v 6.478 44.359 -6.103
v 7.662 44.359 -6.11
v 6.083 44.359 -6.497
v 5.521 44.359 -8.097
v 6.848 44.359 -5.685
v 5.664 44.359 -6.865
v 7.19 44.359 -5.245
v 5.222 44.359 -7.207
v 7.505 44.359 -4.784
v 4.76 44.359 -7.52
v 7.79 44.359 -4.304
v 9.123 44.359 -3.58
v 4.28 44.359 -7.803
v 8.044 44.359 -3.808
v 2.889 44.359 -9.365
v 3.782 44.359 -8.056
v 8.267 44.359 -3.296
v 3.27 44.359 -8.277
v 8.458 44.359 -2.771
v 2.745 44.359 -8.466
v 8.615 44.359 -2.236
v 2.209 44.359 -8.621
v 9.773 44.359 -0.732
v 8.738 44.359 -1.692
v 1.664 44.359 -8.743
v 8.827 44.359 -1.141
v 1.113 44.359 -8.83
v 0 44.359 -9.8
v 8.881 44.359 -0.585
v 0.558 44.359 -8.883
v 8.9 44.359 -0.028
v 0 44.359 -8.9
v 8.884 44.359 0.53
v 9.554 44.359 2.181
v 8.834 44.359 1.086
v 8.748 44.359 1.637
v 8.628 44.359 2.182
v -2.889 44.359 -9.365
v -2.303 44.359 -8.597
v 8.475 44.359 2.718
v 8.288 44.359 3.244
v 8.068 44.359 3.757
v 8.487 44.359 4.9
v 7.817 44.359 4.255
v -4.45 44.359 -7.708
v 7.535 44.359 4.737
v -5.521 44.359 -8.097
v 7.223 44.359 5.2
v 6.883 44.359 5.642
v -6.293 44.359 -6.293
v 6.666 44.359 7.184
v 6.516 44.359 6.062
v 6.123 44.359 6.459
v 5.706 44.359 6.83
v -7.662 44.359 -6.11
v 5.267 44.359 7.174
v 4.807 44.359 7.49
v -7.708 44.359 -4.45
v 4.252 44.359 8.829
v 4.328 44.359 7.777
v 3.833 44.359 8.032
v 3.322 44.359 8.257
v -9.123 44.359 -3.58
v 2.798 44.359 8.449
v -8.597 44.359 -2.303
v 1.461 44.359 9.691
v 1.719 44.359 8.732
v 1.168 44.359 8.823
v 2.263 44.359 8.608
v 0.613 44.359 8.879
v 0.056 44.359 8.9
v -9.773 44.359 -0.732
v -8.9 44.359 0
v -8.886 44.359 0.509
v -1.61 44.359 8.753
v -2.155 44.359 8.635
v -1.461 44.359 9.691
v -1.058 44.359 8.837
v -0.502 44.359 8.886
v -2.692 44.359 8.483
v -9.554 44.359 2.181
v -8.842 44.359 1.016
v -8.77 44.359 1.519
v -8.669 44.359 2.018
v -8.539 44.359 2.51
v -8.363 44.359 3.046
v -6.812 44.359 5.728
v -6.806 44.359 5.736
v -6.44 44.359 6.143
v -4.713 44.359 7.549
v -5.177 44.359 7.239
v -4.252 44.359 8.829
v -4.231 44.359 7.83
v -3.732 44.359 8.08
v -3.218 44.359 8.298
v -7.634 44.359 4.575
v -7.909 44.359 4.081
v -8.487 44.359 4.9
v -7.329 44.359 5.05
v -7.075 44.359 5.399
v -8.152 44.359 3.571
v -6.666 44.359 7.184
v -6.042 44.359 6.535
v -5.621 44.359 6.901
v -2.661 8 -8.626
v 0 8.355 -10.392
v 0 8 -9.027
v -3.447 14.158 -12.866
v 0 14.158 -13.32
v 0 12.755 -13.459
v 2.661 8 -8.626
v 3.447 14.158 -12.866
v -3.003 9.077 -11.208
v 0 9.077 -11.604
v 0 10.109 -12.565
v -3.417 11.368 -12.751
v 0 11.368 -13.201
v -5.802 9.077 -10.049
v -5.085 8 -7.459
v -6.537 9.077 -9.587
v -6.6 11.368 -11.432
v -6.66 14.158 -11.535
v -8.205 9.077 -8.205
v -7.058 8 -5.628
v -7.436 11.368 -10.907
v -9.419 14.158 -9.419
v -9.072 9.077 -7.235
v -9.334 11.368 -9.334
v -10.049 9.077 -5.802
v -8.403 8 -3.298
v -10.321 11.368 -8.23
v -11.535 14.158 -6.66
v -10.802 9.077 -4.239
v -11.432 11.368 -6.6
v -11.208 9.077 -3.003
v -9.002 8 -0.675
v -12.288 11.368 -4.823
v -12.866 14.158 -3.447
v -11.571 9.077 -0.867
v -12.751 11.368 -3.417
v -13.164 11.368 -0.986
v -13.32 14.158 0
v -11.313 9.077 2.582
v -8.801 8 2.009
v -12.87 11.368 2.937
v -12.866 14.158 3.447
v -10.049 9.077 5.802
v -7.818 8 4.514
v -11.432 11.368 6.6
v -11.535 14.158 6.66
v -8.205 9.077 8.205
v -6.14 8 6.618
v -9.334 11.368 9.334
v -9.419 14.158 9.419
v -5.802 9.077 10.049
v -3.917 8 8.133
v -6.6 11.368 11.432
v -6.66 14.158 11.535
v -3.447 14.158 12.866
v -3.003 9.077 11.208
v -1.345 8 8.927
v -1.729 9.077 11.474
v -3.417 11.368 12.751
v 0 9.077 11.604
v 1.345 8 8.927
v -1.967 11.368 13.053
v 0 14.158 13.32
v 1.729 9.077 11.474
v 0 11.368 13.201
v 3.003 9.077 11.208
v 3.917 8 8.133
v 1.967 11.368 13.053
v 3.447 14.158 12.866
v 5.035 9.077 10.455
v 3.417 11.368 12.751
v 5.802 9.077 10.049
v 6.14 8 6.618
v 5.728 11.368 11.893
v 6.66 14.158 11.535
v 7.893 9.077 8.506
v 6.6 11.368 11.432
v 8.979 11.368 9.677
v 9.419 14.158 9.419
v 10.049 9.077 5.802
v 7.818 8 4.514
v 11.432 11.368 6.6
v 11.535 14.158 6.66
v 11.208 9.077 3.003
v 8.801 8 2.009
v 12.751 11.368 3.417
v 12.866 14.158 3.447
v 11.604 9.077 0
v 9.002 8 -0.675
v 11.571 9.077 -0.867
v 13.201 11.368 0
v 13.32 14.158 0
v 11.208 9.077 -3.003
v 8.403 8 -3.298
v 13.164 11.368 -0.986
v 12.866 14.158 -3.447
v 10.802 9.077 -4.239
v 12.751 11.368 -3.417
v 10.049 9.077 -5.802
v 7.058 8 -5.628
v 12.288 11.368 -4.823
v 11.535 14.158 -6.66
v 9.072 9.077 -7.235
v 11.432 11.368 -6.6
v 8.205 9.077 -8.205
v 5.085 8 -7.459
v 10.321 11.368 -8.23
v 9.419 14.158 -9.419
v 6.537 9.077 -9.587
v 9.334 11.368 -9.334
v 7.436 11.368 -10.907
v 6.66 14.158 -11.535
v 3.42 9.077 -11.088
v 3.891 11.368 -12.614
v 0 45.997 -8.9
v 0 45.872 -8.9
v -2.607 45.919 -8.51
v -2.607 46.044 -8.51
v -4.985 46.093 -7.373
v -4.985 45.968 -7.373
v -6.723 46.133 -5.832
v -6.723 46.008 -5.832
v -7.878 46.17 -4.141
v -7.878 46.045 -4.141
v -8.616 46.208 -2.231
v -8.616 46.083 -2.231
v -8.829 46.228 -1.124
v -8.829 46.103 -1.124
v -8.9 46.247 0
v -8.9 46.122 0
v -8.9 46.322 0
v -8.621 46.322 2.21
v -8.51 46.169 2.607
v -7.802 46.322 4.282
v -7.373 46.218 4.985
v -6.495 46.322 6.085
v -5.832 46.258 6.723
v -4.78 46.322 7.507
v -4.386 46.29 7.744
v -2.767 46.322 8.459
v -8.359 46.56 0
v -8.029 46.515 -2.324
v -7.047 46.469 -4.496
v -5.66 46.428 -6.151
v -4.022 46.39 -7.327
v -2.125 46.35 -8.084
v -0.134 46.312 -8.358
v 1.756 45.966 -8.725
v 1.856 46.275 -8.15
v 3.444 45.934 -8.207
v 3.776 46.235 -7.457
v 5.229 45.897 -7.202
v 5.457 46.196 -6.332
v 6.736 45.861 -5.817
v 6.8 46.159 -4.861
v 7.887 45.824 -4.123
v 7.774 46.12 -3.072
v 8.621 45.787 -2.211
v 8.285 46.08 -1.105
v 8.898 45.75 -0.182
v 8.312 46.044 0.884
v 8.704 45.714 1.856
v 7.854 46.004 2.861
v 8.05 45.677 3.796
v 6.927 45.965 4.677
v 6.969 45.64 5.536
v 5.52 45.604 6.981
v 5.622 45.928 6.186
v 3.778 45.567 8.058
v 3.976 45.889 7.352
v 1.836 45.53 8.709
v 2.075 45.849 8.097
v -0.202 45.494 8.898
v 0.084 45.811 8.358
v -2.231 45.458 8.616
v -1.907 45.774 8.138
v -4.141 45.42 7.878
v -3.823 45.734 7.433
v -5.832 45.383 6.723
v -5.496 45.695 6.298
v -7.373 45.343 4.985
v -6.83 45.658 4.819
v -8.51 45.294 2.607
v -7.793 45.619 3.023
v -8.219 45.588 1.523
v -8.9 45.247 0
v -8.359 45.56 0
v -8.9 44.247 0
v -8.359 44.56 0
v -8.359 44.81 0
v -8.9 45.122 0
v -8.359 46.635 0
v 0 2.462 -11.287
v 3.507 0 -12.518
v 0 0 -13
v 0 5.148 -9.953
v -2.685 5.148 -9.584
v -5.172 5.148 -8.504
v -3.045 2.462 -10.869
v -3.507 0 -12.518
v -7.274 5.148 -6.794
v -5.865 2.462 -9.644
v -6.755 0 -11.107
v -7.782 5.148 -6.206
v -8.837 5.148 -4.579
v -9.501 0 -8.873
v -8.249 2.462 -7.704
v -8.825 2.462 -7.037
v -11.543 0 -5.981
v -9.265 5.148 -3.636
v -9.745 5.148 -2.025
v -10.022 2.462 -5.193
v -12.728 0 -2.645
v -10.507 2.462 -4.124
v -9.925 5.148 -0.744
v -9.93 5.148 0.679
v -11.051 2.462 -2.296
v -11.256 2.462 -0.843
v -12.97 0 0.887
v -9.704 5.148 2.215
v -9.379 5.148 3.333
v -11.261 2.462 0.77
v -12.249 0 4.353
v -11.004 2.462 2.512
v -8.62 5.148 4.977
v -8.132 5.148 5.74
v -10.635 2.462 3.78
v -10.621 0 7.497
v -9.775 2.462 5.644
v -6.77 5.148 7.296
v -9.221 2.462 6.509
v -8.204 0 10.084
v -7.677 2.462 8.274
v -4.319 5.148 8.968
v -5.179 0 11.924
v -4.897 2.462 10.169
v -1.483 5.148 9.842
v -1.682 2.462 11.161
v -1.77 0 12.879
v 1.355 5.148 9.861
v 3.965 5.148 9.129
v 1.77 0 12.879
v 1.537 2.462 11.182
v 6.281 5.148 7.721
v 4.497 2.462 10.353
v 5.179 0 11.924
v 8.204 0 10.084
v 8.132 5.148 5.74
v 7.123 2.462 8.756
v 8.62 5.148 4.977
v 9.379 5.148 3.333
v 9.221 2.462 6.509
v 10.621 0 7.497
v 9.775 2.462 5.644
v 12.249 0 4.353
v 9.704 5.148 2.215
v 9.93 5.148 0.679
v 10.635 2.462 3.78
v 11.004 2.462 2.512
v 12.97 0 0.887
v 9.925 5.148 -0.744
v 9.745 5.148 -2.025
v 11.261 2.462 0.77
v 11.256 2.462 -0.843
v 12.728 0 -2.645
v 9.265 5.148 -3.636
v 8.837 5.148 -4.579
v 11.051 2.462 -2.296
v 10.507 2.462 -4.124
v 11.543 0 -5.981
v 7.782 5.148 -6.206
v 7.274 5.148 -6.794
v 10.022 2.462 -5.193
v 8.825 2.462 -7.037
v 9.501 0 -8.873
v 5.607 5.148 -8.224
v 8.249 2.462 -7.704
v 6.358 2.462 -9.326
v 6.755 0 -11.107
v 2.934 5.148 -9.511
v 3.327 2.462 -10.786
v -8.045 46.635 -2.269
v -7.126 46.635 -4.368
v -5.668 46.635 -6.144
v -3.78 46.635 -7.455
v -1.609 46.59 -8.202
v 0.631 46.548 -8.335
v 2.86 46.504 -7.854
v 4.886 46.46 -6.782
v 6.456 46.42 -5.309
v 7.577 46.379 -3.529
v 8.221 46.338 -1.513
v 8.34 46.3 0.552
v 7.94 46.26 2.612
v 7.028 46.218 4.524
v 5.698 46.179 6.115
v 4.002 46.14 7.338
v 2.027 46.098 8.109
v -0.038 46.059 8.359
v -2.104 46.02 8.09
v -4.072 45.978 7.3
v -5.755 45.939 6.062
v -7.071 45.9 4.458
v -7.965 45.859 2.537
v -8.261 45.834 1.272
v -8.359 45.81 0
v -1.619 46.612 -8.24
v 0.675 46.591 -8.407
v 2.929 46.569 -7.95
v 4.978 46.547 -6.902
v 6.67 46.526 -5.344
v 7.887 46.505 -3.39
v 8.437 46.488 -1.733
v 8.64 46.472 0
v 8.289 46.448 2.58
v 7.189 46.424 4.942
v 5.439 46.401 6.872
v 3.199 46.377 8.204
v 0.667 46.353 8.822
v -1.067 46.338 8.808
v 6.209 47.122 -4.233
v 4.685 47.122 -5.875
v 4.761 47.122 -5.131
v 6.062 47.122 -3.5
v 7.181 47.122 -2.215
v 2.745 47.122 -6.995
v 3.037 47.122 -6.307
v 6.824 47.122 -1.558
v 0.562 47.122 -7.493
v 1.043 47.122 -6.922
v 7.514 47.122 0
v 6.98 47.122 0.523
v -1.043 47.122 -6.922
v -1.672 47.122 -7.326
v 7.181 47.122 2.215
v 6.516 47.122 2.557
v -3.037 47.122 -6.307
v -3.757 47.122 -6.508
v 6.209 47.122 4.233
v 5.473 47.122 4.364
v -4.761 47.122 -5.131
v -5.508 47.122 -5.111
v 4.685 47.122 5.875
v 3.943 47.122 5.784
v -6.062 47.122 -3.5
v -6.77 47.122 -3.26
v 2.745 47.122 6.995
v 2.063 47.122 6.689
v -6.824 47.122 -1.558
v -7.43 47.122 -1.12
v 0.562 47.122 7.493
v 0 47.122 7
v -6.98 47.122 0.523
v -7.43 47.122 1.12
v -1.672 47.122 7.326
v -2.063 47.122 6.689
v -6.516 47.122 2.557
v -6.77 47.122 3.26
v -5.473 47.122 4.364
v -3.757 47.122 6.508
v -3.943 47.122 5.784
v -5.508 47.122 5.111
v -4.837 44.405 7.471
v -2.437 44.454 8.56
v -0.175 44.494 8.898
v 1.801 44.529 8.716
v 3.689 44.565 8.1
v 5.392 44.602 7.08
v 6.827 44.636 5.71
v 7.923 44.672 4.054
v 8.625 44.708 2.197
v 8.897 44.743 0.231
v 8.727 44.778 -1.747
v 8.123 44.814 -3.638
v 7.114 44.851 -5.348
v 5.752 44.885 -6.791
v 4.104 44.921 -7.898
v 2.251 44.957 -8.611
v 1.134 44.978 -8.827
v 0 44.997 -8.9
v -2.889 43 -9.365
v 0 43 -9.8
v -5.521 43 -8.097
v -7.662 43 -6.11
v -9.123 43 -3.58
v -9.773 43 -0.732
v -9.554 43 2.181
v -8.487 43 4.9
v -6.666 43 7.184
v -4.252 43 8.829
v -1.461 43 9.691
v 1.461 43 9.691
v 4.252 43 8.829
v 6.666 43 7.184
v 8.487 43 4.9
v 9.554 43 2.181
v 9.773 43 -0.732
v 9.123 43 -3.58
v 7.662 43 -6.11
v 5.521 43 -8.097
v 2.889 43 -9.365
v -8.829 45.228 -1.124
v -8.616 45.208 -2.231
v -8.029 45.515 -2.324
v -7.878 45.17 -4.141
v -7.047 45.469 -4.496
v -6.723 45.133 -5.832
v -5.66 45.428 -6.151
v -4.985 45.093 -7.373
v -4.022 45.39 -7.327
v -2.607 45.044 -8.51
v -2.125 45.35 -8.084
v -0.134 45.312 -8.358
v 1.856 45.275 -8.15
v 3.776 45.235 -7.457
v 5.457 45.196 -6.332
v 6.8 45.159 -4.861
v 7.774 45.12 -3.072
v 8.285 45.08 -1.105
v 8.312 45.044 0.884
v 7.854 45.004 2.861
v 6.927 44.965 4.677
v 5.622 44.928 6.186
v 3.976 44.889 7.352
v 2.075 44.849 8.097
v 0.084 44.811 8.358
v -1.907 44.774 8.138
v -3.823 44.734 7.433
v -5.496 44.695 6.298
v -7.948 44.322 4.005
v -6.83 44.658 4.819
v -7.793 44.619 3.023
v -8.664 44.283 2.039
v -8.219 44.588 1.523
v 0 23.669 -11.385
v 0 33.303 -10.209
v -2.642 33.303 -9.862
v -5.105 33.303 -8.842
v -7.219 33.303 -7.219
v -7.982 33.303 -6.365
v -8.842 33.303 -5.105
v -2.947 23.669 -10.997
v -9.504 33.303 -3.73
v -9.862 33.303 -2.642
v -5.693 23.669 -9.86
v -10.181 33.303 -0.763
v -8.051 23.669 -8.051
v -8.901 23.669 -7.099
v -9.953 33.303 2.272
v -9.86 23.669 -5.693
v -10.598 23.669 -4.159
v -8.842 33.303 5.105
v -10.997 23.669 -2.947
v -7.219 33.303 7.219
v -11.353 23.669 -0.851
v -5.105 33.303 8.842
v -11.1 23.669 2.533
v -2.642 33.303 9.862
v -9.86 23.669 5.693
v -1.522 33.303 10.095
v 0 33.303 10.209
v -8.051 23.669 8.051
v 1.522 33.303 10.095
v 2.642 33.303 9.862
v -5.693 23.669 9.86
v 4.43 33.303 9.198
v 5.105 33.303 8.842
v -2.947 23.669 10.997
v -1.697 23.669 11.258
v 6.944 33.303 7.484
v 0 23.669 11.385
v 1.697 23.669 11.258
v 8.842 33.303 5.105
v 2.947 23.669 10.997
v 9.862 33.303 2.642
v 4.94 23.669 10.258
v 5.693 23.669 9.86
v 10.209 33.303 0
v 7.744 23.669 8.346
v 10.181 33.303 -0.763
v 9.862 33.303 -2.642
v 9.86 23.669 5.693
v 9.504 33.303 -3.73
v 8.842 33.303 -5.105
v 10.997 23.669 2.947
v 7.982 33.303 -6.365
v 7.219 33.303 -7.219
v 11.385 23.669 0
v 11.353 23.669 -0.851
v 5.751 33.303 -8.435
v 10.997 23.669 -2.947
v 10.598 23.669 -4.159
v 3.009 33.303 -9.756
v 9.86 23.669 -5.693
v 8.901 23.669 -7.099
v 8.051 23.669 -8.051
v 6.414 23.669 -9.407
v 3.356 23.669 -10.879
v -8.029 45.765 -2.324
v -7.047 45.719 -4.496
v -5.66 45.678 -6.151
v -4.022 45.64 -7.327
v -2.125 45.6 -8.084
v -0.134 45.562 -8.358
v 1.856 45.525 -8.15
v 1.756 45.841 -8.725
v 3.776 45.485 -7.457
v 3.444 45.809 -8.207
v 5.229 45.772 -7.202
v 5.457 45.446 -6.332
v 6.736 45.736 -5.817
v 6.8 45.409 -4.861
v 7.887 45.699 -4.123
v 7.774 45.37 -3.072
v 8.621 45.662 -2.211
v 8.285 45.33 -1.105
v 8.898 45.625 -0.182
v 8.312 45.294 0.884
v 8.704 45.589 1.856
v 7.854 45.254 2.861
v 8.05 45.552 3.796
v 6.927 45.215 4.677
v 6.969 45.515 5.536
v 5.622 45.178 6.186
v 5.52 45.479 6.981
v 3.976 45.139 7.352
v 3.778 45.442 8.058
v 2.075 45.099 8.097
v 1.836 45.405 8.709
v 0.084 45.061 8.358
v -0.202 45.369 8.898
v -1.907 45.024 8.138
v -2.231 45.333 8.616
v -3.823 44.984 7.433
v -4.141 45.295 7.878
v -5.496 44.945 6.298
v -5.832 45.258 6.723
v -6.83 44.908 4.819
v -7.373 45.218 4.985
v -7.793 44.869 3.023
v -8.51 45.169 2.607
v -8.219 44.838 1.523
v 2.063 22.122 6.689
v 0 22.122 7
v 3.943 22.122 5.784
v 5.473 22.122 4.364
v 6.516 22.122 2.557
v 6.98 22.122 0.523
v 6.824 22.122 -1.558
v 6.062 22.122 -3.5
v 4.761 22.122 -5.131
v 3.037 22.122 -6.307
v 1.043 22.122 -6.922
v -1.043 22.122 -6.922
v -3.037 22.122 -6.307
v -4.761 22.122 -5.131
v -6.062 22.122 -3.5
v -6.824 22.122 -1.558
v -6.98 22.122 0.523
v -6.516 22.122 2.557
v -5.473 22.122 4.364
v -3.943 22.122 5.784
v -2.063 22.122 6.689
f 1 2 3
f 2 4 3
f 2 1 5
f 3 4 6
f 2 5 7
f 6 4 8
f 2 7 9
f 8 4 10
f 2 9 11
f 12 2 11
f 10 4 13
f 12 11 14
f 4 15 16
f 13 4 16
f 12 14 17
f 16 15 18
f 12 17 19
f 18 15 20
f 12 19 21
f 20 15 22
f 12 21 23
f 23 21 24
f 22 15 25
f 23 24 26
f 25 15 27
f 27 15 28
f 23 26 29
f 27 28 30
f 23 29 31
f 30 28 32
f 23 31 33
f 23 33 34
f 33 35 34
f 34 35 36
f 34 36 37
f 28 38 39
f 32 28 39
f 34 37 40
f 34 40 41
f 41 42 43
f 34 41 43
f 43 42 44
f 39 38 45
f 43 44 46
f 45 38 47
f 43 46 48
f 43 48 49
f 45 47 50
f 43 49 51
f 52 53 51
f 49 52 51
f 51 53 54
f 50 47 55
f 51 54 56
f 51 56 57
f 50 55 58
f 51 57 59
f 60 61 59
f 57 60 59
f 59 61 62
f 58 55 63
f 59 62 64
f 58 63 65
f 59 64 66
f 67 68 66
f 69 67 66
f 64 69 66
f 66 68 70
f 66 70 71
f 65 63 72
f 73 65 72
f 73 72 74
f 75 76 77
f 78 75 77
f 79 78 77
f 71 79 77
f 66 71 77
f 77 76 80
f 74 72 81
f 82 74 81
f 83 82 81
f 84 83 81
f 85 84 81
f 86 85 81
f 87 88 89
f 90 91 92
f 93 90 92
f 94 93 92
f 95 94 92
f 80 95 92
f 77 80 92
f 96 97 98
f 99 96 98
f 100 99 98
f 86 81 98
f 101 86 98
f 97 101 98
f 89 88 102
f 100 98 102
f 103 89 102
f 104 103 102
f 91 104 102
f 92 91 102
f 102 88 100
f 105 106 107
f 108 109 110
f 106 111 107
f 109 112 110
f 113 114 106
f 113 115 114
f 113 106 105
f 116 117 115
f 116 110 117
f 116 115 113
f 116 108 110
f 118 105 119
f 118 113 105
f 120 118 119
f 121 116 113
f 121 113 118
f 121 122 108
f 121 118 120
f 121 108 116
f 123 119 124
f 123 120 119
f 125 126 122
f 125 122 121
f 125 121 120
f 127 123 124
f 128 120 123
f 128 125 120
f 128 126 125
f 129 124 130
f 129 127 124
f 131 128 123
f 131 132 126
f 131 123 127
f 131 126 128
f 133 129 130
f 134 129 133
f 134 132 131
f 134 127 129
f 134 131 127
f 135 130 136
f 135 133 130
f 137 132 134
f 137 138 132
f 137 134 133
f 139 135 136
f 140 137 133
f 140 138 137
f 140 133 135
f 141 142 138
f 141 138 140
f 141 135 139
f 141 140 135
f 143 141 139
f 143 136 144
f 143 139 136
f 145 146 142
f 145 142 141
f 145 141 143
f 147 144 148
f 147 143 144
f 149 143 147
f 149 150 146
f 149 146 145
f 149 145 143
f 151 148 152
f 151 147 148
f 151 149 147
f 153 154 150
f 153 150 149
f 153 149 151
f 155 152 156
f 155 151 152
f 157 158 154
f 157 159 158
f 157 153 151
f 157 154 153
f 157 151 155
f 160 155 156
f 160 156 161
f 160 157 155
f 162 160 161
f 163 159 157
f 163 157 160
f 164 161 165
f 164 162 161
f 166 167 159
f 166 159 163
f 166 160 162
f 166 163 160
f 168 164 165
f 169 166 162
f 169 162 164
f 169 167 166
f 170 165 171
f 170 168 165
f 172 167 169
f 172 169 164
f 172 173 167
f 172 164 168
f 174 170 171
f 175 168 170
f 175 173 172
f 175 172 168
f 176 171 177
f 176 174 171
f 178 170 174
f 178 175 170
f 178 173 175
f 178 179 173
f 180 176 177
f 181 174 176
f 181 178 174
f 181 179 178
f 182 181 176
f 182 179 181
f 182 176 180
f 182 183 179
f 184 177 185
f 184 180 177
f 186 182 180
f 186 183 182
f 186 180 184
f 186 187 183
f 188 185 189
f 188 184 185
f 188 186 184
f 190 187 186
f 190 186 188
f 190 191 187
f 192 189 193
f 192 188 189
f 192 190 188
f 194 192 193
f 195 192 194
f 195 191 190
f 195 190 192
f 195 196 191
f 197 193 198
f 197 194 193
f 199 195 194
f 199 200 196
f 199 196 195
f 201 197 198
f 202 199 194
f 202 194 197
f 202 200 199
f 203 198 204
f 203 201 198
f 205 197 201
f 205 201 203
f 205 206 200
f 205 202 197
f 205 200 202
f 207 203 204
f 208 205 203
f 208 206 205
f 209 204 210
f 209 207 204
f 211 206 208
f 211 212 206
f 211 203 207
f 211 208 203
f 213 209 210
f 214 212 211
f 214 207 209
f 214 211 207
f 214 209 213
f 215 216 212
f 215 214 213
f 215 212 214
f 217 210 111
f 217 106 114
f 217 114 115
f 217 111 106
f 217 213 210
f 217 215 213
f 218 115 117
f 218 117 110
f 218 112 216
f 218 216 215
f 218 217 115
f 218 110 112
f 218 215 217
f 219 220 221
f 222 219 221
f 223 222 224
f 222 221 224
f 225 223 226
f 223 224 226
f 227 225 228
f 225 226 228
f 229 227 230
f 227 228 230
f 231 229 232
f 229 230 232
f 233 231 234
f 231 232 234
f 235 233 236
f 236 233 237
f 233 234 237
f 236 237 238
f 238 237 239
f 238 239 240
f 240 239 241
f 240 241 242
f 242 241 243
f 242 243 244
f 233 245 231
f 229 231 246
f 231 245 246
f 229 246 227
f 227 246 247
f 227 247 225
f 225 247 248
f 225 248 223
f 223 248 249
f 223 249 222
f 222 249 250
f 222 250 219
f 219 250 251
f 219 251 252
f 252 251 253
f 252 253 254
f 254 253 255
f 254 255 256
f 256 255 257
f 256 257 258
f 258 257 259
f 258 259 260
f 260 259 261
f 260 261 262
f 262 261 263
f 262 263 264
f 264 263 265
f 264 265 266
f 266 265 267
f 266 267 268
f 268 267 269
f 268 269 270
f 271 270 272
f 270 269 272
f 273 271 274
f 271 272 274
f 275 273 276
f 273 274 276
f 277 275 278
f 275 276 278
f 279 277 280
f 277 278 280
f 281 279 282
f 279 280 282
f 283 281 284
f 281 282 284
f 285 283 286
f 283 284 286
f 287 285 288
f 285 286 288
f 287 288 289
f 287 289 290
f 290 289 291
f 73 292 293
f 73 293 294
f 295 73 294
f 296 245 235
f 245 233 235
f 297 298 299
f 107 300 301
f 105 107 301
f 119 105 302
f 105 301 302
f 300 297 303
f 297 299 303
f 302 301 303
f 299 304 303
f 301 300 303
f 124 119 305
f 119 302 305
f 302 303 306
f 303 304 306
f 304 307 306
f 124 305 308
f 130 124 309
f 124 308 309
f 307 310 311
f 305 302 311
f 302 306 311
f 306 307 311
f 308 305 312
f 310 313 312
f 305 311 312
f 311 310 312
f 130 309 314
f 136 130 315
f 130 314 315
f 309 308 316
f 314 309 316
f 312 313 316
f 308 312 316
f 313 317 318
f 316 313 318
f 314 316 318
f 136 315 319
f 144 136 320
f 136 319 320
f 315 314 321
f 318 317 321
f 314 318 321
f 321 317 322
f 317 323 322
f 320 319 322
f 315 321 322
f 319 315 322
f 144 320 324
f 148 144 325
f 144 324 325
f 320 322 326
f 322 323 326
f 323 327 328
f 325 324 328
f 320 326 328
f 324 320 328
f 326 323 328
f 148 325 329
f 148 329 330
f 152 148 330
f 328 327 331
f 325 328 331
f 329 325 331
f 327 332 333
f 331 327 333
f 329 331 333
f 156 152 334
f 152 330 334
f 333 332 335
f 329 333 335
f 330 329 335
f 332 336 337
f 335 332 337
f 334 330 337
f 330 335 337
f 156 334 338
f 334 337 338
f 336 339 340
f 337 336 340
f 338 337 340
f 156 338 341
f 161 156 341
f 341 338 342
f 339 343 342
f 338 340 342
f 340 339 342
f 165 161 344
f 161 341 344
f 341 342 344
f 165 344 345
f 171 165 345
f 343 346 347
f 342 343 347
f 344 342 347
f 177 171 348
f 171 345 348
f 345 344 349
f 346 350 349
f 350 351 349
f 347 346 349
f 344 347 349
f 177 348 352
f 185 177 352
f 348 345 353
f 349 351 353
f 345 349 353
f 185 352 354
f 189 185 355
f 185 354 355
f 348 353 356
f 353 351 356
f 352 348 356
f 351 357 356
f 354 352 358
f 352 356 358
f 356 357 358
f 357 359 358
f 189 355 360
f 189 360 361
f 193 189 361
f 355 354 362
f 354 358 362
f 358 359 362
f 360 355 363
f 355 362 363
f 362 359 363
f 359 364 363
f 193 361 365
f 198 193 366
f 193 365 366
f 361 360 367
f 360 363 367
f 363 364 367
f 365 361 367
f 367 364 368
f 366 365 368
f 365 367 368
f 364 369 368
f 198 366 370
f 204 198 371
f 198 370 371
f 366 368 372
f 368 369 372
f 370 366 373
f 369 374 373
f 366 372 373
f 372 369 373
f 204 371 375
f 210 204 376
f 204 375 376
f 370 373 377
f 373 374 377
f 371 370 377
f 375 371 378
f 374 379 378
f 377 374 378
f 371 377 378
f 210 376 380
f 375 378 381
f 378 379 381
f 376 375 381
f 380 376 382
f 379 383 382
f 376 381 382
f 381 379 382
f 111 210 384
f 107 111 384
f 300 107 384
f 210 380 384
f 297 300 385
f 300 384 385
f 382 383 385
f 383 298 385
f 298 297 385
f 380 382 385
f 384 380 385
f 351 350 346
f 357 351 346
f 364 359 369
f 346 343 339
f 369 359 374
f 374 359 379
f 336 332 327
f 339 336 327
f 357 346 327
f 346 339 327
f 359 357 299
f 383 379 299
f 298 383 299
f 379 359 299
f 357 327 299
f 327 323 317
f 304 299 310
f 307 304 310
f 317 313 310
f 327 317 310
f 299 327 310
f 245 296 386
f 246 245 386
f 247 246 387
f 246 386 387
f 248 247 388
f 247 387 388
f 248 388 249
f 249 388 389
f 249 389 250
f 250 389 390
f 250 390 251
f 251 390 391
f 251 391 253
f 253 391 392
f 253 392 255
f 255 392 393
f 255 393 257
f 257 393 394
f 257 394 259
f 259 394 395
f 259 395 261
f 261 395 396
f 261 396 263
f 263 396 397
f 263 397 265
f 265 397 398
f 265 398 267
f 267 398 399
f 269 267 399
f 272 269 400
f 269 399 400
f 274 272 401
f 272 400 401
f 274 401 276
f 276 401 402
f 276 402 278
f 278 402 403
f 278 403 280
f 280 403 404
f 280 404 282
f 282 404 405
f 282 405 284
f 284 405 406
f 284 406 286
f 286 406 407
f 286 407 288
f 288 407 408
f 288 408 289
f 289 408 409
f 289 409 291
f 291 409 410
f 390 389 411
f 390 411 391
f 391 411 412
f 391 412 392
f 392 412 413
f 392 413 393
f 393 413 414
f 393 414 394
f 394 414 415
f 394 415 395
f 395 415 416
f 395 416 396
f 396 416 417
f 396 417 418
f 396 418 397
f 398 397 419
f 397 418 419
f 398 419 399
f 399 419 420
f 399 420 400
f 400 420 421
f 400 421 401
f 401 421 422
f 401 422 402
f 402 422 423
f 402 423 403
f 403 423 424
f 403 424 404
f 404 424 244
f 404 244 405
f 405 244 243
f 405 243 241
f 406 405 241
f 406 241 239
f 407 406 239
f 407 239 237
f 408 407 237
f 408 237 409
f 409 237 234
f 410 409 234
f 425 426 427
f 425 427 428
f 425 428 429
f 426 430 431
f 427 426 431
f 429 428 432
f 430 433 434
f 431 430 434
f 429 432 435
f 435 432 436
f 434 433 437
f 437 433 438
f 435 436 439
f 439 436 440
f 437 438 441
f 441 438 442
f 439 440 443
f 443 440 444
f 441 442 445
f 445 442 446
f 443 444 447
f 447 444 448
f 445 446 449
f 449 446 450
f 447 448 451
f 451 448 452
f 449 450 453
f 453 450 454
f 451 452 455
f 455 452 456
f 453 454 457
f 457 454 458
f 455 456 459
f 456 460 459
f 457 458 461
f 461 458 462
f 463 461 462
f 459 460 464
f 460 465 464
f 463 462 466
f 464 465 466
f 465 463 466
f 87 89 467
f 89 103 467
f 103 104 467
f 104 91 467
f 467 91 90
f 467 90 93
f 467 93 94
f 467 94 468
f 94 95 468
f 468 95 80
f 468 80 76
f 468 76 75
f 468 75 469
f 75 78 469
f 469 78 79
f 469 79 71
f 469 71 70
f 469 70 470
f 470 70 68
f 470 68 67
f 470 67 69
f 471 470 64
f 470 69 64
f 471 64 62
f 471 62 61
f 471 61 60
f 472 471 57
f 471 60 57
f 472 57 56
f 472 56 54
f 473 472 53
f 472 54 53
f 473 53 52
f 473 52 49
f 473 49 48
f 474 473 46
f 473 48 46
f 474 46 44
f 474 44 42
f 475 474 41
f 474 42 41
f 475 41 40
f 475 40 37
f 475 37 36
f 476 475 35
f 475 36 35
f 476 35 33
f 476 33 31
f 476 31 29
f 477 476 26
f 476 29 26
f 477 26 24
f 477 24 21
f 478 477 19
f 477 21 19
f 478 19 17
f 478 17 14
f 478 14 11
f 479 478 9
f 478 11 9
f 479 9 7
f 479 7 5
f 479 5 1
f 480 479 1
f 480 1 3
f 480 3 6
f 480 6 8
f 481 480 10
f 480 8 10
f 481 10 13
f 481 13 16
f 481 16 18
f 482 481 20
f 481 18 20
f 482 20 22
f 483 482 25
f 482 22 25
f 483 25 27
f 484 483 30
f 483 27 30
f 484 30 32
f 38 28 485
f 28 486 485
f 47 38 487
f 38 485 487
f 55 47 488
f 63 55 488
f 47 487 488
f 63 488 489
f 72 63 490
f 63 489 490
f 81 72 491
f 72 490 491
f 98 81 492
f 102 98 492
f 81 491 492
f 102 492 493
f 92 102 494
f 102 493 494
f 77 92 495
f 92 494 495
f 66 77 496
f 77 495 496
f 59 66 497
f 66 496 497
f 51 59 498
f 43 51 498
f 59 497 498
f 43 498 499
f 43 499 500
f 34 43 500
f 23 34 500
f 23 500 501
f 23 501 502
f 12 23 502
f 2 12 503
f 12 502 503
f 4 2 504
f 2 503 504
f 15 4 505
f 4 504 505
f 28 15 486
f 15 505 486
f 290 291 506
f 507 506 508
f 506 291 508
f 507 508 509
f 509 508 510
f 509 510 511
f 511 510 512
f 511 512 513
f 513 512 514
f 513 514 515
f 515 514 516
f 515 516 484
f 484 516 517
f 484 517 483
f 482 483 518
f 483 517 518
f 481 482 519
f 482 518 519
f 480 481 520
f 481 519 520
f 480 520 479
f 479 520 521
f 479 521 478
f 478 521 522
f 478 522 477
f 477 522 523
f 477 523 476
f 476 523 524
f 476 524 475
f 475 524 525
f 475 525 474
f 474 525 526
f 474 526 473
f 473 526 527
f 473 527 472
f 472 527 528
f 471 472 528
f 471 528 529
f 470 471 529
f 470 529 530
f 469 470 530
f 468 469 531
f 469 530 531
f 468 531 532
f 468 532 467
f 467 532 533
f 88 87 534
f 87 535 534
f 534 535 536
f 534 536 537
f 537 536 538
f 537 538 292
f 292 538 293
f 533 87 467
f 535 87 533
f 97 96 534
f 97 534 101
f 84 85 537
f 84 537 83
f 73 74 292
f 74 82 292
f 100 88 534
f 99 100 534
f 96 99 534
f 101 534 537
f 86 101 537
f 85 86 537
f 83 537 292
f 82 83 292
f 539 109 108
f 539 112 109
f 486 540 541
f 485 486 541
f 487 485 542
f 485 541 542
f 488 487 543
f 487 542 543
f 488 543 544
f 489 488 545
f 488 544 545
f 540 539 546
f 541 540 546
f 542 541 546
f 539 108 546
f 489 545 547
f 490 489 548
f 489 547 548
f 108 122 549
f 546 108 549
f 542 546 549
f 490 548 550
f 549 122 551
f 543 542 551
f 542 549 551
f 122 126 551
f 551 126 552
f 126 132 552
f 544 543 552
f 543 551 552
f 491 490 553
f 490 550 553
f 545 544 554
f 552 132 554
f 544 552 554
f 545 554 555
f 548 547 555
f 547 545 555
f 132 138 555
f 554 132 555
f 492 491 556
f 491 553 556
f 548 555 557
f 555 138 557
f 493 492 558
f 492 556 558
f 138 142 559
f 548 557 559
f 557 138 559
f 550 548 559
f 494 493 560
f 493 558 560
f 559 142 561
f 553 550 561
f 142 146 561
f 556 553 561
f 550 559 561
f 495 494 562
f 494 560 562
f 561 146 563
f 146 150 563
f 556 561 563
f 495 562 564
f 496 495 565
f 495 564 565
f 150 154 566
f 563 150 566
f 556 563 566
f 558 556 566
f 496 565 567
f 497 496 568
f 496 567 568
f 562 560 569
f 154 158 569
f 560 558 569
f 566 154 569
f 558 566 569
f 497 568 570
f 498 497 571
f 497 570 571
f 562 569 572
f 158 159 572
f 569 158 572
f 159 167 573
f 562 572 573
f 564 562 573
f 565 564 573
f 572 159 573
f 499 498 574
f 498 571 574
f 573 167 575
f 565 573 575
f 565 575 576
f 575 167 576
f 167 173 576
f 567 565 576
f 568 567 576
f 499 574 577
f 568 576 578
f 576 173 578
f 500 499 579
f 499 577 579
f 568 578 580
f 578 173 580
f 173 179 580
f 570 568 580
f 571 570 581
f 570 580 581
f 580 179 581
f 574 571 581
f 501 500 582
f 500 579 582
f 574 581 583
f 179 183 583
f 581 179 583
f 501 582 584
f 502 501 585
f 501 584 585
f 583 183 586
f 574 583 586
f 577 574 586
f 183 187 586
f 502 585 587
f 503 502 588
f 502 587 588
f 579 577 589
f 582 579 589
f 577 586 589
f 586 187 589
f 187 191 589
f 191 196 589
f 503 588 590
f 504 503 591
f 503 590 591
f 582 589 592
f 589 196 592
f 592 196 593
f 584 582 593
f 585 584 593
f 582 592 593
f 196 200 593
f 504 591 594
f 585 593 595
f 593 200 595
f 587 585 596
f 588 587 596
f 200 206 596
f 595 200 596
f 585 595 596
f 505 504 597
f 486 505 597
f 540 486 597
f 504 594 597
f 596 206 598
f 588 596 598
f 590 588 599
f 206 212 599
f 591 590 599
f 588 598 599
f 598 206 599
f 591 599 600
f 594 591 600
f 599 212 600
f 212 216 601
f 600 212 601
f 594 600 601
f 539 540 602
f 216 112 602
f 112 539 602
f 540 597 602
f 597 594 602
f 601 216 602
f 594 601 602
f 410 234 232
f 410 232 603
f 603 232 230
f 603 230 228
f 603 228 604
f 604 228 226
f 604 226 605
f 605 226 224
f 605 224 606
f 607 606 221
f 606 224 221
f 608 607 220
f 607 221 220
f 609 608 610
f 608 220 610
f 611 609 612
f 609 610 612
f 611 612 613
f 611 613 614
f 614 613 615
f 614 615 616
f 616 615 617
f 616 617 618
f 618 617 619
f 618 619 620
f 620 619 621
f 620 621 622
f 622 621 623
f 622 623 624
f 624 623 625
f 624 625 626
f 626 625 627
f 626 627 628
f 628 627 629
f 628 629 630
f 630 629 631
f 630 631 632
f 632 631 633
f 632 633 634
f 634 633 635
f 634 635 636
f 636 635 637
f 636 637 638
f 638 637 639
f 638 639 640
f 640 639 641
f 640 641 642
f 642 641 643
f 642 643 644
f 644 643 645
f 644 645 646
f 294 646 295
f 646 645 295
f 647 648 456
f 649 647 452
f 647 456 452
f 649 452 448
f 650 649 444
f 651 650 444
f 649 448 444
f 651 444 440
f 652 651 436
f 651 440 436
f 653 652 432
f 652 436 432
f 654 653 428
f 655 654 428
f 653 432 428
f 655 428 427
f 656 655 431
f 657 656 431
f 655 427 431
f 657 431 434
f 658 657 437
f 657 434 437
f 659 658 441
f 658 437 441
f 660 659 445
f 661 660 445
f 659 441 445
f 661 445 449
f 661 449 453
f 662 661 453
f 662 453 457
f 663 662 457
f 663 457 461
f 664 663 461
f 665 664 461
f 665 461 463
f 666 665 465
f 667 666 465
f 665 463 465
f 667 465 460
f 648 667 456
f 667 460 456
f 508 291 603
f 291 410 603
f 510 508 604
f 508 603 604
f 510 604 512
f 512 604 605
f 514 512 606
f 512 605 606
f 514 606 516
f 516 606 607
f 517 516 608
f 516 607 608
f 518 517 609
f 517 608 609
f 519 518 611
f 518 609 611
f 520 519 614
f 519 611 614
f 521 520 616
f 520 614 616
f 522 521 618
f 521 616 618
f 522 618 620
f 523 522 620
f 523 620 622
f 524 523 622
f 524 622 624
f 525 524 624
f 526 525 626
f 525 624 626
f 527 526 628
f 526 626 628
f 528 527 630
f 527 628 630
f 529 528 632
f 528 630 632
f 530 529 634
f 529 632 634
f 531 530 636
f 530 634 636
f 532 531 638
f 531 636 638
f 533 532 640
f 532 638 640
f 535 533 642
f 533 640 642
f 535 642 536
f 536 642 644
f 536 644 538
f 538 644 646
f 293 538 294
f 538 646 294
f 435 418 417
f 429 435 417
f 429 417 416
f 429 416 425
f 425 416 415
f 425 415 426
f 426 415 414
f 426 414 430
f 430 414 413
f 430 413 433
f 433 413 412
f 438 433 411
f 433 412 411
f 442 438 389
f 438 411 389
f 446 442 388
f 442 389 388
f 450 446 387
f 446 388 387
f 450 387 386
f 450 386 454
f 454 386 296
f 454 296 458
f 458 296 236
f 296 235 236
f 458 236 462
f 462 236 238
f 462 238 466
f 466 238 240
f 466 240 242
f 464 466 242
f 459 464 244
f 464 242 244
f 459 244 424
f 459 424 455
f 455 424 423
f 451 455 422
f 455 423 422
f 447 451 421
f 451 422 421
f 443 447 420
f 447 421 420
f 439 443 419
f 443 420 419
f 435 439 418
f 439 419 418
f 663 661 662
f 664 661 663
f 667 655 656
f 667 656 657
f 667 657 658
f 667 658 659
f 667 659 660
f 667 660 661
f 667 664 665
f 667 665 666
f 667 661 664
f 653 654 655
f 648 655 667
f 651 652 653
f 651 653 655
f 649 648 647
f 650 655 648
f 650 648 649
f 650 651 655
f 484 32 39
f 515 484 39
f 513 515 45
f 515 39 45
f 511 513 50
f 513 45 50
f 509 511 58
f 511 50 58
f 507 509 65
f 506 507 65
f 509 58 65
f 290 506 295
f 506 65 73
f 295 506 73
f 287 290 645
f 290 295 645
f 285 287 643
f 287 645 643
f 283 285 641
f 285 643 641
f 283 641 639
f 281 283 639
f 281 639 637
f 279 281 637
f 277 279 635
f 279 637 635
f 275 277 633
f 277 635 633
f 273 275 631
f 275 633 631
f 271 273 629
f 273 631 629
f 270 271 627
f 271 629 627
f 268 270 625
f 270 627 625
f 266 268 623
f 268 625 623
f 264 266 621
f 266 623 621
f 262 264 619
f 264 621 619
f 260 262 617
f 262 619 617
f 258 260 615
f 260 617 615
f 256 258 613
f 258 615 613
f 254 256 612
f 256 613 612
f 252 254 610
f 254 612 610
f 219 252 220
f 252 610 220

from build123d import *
from build123d.topology import SkipClean

# Parameters (mm, degrees)
GWINT1_PITCH               = 1
SZKIC10_R                  = 7
WYTNIJ_WYCI_GNI_CIE2_DEPTH = 25
ZAOKR_GLENIE1_R            = 5


with BuildPart() as part:
    # Szkic2 → Obrót1 (revolve)
    with BuildSketch(Plane.XY, mode=Mode.PRIVATE) as obr_t1_sk:
        with BuildLine():
            Line((0, 0), (0, 8))
            Line((0, 8), (9.027373354, 8))
            ThreePointArc((9.027373354, 8), (10.570833484, 3.780088701), (13, 0))
            Line((13, 0), (0, 0))
        make_face()
    revolve(obr_t1_sk.sketch.rotate(Axis((0, 0, 0), (0, 1, 0)), 90), axis=Axis((0, 0, 0), (0, 1, 0)))

    # Szkic4 → Obrót2 (revolve)
    with BuildSketch(Plane.XY, mode=Mode.PRIVATE) as obr_t2_sk:
        with BuildLine():
            Line((0, 8), (0, 43))
            Line((0, 43), (0, 47.12232406))
            Line((0, 47.12232406), (8.9, 47.12232406))
            Line((8.9, 47.12232406), (8.9, 45.06116203))
            Line((8.9, 45.06116203), (8.9, 44.597825987))
            Line((8.9, 44.597825987), (8.9, 44.463010207))
            Line((8.9, 44.463010207), (8.9, 44.359094252))
            Line((8.9, 44.359094252), (9.8, 44.359094252))
            Line((9.8, 44.359094252), (9.8, 43))
            ThreePointArc((9.8, 43), (11.129787622, 25.311282732), (15, 8))
            Line((15, 8), (0, 8))
        make_face()
    revolve(obr_t2_sk.sketch.rotate(Axis((0, 8, 0), (0, 1, 0)), 90), axis=Axis((0, 8, 0), (0, 1, 0)))

    # Gwint1: the profile of Profil gwintu1 profile screwed along a right-hand helix of 2 turns, 8 arcs to a turn; built about Z, then put on its axis
    with SkipClean():  # the faces are left unmerged after this step: merging them gives an invalid solid
        gwint1_z = Axis((0, 0, 0), (0, 0, 1))
        gwint1_corners = [(8.9003, 0, -0.000173205), (8.9003, 0, 0.875173202), (8.358734125, 0, 0.562499998), (8.358734125, 0, 0.312499998)]
        with BuildLine(mode=Mode.PRIVATE) as gwint1_profile:
            Line(gwint1_corners[0], gwint1_corners[1])
            Line(gwint1_corners[1], gwint1_corners[2])
            Line(gwint1_corners[2], gwint1_corners[3])
            Line(gwint1_corners[3], gwint1_corners[0])
        gwint1_cap = Face(gwint1_profile.wire())
        gwint1_turn_angles = [0, 22.5, 45, 67.5, 90, 112.5, 135, 157.5, 180, 202.5, 225, 247.5, 270, 292.5, 315, 337.5, 360]
        gwint1_turn_weights = [1, 0.9238795325112867, 1, 0.9238795325112867, 1, 0.9238795325112867, 1, 0.9238795325112867, 1, 0.9238795325112867, 1, 0.9238795325112867, 1, 0.9238795325112867, 1, 0.9238795325112867, 1]
        gwint1_turn_rails = [Edge.make_bspline([Vector(p[0], p[1], 0).rotate(gwint1_z, gwint1_turn_angles[k]) / gwint1_turn_weights[k] + Vector(0, 0, p[2] + GWINT1_PITCH * gwint1_turn_angles[k] / 360) for k in range(17)], [0, 0, 0, 1, 1, 2, 2, 3, 3, 4, 4, 5, 5, 6, 6, 7, 7, 8, 8, 8], 2, gwint1_turn_weights) for p in gwint1_corners]
        gwint1_turn_sides = [Face.make_surface_from_curves(gwint1_turn_rails[p[0]], gwint1_turn_rails[p[1]]) for p in [(0, 1), (1, 2), (2, 3), (3, 0)]]
        gwint1 = Plane(origin=(0, 47.12232406, 0), x_dir=(-1, 0, 0), z_dir=(0, -1, 0)) * Solid(Shell([*[p.moved(Location((0, 0, GWINT1_PITCH * i))) for i in range(2) for p in gwint1_turn_sides], gwint1_cap, gwint1_cap.rotate(gwint1_z, 720).moved(Location((0, 0, GWINT1_PITCH * 720 / 360)))]))
        add(gwint1, mode=Mode.SUBTRACT)

    # Wycięcie-wyciągnięcie po ścieżce1: sweep along a path in Szkic8
    with BuildLine(Plane(origin=(0, 47.12232406, 0), x_dir=(1, 0, 0), z_dir=(0, 1, 0))) as wyci_cie_wyci_gni_cie_po_cie_ce1_path:
        CenterArc((0, 0), 13, 0, 360)
    # Szkic9 → Wycięcie-wyciągnięcie po ścieżce1 (sweep, cut)
    with BuildSketch(Plane.XY):
        Polygon((8.9, 47.12232406), (8.9, 46.32232406), (7.514359354, 47.12232406), align=None)
    sweep(path=wyci_cie_wyci_gni_cie_po_cie_ce1_path.line, mode=Mode.SUBTRACT)

    # Szkic10 → Wytnij-wyciągnięcie2 (cut)
    with BuildSketch(Plane(origin=(0, 47.12232406, 0), x_dir=(1, 0, 0), z_dir=(0, 1, 0))):
        with Locations(Location((0, 0, 0), (0, 0, 270))):
            Circle(SZKIC10_R)
    extrude(amount=-WYTNIJ_WYCI_GNI_CIE2_DEPTH, mode=Mode.SUBTRACT)

    # Zaokrąglenie1
    # the kernel refuses this fillet: 5 mm, written as the material it takes off along each edge
    with BuildSketch(Plane(origin=(0, 8, 0), x_dir=(0, 0, -1), z_dir=(1, 0, 0))) as zaokr_glenie1_piece_1:
        with BuildLine():
            CenterArc((8.463528587, 4.968106186), ZAOKR_GLENIE1_R, 276.47495836, 97.293161414)
            Line((9.027373354, 0), (15, 0))
            ThreePointArc((15, 0), (14.119819715, 3.068091884), (13.319862852, 6.158071522))
        make_face()
    revolve(axis=Axis((0, 8, 0), (0, 1, 0)), mode=Mode.SUBTRACT)


solid = part.part
